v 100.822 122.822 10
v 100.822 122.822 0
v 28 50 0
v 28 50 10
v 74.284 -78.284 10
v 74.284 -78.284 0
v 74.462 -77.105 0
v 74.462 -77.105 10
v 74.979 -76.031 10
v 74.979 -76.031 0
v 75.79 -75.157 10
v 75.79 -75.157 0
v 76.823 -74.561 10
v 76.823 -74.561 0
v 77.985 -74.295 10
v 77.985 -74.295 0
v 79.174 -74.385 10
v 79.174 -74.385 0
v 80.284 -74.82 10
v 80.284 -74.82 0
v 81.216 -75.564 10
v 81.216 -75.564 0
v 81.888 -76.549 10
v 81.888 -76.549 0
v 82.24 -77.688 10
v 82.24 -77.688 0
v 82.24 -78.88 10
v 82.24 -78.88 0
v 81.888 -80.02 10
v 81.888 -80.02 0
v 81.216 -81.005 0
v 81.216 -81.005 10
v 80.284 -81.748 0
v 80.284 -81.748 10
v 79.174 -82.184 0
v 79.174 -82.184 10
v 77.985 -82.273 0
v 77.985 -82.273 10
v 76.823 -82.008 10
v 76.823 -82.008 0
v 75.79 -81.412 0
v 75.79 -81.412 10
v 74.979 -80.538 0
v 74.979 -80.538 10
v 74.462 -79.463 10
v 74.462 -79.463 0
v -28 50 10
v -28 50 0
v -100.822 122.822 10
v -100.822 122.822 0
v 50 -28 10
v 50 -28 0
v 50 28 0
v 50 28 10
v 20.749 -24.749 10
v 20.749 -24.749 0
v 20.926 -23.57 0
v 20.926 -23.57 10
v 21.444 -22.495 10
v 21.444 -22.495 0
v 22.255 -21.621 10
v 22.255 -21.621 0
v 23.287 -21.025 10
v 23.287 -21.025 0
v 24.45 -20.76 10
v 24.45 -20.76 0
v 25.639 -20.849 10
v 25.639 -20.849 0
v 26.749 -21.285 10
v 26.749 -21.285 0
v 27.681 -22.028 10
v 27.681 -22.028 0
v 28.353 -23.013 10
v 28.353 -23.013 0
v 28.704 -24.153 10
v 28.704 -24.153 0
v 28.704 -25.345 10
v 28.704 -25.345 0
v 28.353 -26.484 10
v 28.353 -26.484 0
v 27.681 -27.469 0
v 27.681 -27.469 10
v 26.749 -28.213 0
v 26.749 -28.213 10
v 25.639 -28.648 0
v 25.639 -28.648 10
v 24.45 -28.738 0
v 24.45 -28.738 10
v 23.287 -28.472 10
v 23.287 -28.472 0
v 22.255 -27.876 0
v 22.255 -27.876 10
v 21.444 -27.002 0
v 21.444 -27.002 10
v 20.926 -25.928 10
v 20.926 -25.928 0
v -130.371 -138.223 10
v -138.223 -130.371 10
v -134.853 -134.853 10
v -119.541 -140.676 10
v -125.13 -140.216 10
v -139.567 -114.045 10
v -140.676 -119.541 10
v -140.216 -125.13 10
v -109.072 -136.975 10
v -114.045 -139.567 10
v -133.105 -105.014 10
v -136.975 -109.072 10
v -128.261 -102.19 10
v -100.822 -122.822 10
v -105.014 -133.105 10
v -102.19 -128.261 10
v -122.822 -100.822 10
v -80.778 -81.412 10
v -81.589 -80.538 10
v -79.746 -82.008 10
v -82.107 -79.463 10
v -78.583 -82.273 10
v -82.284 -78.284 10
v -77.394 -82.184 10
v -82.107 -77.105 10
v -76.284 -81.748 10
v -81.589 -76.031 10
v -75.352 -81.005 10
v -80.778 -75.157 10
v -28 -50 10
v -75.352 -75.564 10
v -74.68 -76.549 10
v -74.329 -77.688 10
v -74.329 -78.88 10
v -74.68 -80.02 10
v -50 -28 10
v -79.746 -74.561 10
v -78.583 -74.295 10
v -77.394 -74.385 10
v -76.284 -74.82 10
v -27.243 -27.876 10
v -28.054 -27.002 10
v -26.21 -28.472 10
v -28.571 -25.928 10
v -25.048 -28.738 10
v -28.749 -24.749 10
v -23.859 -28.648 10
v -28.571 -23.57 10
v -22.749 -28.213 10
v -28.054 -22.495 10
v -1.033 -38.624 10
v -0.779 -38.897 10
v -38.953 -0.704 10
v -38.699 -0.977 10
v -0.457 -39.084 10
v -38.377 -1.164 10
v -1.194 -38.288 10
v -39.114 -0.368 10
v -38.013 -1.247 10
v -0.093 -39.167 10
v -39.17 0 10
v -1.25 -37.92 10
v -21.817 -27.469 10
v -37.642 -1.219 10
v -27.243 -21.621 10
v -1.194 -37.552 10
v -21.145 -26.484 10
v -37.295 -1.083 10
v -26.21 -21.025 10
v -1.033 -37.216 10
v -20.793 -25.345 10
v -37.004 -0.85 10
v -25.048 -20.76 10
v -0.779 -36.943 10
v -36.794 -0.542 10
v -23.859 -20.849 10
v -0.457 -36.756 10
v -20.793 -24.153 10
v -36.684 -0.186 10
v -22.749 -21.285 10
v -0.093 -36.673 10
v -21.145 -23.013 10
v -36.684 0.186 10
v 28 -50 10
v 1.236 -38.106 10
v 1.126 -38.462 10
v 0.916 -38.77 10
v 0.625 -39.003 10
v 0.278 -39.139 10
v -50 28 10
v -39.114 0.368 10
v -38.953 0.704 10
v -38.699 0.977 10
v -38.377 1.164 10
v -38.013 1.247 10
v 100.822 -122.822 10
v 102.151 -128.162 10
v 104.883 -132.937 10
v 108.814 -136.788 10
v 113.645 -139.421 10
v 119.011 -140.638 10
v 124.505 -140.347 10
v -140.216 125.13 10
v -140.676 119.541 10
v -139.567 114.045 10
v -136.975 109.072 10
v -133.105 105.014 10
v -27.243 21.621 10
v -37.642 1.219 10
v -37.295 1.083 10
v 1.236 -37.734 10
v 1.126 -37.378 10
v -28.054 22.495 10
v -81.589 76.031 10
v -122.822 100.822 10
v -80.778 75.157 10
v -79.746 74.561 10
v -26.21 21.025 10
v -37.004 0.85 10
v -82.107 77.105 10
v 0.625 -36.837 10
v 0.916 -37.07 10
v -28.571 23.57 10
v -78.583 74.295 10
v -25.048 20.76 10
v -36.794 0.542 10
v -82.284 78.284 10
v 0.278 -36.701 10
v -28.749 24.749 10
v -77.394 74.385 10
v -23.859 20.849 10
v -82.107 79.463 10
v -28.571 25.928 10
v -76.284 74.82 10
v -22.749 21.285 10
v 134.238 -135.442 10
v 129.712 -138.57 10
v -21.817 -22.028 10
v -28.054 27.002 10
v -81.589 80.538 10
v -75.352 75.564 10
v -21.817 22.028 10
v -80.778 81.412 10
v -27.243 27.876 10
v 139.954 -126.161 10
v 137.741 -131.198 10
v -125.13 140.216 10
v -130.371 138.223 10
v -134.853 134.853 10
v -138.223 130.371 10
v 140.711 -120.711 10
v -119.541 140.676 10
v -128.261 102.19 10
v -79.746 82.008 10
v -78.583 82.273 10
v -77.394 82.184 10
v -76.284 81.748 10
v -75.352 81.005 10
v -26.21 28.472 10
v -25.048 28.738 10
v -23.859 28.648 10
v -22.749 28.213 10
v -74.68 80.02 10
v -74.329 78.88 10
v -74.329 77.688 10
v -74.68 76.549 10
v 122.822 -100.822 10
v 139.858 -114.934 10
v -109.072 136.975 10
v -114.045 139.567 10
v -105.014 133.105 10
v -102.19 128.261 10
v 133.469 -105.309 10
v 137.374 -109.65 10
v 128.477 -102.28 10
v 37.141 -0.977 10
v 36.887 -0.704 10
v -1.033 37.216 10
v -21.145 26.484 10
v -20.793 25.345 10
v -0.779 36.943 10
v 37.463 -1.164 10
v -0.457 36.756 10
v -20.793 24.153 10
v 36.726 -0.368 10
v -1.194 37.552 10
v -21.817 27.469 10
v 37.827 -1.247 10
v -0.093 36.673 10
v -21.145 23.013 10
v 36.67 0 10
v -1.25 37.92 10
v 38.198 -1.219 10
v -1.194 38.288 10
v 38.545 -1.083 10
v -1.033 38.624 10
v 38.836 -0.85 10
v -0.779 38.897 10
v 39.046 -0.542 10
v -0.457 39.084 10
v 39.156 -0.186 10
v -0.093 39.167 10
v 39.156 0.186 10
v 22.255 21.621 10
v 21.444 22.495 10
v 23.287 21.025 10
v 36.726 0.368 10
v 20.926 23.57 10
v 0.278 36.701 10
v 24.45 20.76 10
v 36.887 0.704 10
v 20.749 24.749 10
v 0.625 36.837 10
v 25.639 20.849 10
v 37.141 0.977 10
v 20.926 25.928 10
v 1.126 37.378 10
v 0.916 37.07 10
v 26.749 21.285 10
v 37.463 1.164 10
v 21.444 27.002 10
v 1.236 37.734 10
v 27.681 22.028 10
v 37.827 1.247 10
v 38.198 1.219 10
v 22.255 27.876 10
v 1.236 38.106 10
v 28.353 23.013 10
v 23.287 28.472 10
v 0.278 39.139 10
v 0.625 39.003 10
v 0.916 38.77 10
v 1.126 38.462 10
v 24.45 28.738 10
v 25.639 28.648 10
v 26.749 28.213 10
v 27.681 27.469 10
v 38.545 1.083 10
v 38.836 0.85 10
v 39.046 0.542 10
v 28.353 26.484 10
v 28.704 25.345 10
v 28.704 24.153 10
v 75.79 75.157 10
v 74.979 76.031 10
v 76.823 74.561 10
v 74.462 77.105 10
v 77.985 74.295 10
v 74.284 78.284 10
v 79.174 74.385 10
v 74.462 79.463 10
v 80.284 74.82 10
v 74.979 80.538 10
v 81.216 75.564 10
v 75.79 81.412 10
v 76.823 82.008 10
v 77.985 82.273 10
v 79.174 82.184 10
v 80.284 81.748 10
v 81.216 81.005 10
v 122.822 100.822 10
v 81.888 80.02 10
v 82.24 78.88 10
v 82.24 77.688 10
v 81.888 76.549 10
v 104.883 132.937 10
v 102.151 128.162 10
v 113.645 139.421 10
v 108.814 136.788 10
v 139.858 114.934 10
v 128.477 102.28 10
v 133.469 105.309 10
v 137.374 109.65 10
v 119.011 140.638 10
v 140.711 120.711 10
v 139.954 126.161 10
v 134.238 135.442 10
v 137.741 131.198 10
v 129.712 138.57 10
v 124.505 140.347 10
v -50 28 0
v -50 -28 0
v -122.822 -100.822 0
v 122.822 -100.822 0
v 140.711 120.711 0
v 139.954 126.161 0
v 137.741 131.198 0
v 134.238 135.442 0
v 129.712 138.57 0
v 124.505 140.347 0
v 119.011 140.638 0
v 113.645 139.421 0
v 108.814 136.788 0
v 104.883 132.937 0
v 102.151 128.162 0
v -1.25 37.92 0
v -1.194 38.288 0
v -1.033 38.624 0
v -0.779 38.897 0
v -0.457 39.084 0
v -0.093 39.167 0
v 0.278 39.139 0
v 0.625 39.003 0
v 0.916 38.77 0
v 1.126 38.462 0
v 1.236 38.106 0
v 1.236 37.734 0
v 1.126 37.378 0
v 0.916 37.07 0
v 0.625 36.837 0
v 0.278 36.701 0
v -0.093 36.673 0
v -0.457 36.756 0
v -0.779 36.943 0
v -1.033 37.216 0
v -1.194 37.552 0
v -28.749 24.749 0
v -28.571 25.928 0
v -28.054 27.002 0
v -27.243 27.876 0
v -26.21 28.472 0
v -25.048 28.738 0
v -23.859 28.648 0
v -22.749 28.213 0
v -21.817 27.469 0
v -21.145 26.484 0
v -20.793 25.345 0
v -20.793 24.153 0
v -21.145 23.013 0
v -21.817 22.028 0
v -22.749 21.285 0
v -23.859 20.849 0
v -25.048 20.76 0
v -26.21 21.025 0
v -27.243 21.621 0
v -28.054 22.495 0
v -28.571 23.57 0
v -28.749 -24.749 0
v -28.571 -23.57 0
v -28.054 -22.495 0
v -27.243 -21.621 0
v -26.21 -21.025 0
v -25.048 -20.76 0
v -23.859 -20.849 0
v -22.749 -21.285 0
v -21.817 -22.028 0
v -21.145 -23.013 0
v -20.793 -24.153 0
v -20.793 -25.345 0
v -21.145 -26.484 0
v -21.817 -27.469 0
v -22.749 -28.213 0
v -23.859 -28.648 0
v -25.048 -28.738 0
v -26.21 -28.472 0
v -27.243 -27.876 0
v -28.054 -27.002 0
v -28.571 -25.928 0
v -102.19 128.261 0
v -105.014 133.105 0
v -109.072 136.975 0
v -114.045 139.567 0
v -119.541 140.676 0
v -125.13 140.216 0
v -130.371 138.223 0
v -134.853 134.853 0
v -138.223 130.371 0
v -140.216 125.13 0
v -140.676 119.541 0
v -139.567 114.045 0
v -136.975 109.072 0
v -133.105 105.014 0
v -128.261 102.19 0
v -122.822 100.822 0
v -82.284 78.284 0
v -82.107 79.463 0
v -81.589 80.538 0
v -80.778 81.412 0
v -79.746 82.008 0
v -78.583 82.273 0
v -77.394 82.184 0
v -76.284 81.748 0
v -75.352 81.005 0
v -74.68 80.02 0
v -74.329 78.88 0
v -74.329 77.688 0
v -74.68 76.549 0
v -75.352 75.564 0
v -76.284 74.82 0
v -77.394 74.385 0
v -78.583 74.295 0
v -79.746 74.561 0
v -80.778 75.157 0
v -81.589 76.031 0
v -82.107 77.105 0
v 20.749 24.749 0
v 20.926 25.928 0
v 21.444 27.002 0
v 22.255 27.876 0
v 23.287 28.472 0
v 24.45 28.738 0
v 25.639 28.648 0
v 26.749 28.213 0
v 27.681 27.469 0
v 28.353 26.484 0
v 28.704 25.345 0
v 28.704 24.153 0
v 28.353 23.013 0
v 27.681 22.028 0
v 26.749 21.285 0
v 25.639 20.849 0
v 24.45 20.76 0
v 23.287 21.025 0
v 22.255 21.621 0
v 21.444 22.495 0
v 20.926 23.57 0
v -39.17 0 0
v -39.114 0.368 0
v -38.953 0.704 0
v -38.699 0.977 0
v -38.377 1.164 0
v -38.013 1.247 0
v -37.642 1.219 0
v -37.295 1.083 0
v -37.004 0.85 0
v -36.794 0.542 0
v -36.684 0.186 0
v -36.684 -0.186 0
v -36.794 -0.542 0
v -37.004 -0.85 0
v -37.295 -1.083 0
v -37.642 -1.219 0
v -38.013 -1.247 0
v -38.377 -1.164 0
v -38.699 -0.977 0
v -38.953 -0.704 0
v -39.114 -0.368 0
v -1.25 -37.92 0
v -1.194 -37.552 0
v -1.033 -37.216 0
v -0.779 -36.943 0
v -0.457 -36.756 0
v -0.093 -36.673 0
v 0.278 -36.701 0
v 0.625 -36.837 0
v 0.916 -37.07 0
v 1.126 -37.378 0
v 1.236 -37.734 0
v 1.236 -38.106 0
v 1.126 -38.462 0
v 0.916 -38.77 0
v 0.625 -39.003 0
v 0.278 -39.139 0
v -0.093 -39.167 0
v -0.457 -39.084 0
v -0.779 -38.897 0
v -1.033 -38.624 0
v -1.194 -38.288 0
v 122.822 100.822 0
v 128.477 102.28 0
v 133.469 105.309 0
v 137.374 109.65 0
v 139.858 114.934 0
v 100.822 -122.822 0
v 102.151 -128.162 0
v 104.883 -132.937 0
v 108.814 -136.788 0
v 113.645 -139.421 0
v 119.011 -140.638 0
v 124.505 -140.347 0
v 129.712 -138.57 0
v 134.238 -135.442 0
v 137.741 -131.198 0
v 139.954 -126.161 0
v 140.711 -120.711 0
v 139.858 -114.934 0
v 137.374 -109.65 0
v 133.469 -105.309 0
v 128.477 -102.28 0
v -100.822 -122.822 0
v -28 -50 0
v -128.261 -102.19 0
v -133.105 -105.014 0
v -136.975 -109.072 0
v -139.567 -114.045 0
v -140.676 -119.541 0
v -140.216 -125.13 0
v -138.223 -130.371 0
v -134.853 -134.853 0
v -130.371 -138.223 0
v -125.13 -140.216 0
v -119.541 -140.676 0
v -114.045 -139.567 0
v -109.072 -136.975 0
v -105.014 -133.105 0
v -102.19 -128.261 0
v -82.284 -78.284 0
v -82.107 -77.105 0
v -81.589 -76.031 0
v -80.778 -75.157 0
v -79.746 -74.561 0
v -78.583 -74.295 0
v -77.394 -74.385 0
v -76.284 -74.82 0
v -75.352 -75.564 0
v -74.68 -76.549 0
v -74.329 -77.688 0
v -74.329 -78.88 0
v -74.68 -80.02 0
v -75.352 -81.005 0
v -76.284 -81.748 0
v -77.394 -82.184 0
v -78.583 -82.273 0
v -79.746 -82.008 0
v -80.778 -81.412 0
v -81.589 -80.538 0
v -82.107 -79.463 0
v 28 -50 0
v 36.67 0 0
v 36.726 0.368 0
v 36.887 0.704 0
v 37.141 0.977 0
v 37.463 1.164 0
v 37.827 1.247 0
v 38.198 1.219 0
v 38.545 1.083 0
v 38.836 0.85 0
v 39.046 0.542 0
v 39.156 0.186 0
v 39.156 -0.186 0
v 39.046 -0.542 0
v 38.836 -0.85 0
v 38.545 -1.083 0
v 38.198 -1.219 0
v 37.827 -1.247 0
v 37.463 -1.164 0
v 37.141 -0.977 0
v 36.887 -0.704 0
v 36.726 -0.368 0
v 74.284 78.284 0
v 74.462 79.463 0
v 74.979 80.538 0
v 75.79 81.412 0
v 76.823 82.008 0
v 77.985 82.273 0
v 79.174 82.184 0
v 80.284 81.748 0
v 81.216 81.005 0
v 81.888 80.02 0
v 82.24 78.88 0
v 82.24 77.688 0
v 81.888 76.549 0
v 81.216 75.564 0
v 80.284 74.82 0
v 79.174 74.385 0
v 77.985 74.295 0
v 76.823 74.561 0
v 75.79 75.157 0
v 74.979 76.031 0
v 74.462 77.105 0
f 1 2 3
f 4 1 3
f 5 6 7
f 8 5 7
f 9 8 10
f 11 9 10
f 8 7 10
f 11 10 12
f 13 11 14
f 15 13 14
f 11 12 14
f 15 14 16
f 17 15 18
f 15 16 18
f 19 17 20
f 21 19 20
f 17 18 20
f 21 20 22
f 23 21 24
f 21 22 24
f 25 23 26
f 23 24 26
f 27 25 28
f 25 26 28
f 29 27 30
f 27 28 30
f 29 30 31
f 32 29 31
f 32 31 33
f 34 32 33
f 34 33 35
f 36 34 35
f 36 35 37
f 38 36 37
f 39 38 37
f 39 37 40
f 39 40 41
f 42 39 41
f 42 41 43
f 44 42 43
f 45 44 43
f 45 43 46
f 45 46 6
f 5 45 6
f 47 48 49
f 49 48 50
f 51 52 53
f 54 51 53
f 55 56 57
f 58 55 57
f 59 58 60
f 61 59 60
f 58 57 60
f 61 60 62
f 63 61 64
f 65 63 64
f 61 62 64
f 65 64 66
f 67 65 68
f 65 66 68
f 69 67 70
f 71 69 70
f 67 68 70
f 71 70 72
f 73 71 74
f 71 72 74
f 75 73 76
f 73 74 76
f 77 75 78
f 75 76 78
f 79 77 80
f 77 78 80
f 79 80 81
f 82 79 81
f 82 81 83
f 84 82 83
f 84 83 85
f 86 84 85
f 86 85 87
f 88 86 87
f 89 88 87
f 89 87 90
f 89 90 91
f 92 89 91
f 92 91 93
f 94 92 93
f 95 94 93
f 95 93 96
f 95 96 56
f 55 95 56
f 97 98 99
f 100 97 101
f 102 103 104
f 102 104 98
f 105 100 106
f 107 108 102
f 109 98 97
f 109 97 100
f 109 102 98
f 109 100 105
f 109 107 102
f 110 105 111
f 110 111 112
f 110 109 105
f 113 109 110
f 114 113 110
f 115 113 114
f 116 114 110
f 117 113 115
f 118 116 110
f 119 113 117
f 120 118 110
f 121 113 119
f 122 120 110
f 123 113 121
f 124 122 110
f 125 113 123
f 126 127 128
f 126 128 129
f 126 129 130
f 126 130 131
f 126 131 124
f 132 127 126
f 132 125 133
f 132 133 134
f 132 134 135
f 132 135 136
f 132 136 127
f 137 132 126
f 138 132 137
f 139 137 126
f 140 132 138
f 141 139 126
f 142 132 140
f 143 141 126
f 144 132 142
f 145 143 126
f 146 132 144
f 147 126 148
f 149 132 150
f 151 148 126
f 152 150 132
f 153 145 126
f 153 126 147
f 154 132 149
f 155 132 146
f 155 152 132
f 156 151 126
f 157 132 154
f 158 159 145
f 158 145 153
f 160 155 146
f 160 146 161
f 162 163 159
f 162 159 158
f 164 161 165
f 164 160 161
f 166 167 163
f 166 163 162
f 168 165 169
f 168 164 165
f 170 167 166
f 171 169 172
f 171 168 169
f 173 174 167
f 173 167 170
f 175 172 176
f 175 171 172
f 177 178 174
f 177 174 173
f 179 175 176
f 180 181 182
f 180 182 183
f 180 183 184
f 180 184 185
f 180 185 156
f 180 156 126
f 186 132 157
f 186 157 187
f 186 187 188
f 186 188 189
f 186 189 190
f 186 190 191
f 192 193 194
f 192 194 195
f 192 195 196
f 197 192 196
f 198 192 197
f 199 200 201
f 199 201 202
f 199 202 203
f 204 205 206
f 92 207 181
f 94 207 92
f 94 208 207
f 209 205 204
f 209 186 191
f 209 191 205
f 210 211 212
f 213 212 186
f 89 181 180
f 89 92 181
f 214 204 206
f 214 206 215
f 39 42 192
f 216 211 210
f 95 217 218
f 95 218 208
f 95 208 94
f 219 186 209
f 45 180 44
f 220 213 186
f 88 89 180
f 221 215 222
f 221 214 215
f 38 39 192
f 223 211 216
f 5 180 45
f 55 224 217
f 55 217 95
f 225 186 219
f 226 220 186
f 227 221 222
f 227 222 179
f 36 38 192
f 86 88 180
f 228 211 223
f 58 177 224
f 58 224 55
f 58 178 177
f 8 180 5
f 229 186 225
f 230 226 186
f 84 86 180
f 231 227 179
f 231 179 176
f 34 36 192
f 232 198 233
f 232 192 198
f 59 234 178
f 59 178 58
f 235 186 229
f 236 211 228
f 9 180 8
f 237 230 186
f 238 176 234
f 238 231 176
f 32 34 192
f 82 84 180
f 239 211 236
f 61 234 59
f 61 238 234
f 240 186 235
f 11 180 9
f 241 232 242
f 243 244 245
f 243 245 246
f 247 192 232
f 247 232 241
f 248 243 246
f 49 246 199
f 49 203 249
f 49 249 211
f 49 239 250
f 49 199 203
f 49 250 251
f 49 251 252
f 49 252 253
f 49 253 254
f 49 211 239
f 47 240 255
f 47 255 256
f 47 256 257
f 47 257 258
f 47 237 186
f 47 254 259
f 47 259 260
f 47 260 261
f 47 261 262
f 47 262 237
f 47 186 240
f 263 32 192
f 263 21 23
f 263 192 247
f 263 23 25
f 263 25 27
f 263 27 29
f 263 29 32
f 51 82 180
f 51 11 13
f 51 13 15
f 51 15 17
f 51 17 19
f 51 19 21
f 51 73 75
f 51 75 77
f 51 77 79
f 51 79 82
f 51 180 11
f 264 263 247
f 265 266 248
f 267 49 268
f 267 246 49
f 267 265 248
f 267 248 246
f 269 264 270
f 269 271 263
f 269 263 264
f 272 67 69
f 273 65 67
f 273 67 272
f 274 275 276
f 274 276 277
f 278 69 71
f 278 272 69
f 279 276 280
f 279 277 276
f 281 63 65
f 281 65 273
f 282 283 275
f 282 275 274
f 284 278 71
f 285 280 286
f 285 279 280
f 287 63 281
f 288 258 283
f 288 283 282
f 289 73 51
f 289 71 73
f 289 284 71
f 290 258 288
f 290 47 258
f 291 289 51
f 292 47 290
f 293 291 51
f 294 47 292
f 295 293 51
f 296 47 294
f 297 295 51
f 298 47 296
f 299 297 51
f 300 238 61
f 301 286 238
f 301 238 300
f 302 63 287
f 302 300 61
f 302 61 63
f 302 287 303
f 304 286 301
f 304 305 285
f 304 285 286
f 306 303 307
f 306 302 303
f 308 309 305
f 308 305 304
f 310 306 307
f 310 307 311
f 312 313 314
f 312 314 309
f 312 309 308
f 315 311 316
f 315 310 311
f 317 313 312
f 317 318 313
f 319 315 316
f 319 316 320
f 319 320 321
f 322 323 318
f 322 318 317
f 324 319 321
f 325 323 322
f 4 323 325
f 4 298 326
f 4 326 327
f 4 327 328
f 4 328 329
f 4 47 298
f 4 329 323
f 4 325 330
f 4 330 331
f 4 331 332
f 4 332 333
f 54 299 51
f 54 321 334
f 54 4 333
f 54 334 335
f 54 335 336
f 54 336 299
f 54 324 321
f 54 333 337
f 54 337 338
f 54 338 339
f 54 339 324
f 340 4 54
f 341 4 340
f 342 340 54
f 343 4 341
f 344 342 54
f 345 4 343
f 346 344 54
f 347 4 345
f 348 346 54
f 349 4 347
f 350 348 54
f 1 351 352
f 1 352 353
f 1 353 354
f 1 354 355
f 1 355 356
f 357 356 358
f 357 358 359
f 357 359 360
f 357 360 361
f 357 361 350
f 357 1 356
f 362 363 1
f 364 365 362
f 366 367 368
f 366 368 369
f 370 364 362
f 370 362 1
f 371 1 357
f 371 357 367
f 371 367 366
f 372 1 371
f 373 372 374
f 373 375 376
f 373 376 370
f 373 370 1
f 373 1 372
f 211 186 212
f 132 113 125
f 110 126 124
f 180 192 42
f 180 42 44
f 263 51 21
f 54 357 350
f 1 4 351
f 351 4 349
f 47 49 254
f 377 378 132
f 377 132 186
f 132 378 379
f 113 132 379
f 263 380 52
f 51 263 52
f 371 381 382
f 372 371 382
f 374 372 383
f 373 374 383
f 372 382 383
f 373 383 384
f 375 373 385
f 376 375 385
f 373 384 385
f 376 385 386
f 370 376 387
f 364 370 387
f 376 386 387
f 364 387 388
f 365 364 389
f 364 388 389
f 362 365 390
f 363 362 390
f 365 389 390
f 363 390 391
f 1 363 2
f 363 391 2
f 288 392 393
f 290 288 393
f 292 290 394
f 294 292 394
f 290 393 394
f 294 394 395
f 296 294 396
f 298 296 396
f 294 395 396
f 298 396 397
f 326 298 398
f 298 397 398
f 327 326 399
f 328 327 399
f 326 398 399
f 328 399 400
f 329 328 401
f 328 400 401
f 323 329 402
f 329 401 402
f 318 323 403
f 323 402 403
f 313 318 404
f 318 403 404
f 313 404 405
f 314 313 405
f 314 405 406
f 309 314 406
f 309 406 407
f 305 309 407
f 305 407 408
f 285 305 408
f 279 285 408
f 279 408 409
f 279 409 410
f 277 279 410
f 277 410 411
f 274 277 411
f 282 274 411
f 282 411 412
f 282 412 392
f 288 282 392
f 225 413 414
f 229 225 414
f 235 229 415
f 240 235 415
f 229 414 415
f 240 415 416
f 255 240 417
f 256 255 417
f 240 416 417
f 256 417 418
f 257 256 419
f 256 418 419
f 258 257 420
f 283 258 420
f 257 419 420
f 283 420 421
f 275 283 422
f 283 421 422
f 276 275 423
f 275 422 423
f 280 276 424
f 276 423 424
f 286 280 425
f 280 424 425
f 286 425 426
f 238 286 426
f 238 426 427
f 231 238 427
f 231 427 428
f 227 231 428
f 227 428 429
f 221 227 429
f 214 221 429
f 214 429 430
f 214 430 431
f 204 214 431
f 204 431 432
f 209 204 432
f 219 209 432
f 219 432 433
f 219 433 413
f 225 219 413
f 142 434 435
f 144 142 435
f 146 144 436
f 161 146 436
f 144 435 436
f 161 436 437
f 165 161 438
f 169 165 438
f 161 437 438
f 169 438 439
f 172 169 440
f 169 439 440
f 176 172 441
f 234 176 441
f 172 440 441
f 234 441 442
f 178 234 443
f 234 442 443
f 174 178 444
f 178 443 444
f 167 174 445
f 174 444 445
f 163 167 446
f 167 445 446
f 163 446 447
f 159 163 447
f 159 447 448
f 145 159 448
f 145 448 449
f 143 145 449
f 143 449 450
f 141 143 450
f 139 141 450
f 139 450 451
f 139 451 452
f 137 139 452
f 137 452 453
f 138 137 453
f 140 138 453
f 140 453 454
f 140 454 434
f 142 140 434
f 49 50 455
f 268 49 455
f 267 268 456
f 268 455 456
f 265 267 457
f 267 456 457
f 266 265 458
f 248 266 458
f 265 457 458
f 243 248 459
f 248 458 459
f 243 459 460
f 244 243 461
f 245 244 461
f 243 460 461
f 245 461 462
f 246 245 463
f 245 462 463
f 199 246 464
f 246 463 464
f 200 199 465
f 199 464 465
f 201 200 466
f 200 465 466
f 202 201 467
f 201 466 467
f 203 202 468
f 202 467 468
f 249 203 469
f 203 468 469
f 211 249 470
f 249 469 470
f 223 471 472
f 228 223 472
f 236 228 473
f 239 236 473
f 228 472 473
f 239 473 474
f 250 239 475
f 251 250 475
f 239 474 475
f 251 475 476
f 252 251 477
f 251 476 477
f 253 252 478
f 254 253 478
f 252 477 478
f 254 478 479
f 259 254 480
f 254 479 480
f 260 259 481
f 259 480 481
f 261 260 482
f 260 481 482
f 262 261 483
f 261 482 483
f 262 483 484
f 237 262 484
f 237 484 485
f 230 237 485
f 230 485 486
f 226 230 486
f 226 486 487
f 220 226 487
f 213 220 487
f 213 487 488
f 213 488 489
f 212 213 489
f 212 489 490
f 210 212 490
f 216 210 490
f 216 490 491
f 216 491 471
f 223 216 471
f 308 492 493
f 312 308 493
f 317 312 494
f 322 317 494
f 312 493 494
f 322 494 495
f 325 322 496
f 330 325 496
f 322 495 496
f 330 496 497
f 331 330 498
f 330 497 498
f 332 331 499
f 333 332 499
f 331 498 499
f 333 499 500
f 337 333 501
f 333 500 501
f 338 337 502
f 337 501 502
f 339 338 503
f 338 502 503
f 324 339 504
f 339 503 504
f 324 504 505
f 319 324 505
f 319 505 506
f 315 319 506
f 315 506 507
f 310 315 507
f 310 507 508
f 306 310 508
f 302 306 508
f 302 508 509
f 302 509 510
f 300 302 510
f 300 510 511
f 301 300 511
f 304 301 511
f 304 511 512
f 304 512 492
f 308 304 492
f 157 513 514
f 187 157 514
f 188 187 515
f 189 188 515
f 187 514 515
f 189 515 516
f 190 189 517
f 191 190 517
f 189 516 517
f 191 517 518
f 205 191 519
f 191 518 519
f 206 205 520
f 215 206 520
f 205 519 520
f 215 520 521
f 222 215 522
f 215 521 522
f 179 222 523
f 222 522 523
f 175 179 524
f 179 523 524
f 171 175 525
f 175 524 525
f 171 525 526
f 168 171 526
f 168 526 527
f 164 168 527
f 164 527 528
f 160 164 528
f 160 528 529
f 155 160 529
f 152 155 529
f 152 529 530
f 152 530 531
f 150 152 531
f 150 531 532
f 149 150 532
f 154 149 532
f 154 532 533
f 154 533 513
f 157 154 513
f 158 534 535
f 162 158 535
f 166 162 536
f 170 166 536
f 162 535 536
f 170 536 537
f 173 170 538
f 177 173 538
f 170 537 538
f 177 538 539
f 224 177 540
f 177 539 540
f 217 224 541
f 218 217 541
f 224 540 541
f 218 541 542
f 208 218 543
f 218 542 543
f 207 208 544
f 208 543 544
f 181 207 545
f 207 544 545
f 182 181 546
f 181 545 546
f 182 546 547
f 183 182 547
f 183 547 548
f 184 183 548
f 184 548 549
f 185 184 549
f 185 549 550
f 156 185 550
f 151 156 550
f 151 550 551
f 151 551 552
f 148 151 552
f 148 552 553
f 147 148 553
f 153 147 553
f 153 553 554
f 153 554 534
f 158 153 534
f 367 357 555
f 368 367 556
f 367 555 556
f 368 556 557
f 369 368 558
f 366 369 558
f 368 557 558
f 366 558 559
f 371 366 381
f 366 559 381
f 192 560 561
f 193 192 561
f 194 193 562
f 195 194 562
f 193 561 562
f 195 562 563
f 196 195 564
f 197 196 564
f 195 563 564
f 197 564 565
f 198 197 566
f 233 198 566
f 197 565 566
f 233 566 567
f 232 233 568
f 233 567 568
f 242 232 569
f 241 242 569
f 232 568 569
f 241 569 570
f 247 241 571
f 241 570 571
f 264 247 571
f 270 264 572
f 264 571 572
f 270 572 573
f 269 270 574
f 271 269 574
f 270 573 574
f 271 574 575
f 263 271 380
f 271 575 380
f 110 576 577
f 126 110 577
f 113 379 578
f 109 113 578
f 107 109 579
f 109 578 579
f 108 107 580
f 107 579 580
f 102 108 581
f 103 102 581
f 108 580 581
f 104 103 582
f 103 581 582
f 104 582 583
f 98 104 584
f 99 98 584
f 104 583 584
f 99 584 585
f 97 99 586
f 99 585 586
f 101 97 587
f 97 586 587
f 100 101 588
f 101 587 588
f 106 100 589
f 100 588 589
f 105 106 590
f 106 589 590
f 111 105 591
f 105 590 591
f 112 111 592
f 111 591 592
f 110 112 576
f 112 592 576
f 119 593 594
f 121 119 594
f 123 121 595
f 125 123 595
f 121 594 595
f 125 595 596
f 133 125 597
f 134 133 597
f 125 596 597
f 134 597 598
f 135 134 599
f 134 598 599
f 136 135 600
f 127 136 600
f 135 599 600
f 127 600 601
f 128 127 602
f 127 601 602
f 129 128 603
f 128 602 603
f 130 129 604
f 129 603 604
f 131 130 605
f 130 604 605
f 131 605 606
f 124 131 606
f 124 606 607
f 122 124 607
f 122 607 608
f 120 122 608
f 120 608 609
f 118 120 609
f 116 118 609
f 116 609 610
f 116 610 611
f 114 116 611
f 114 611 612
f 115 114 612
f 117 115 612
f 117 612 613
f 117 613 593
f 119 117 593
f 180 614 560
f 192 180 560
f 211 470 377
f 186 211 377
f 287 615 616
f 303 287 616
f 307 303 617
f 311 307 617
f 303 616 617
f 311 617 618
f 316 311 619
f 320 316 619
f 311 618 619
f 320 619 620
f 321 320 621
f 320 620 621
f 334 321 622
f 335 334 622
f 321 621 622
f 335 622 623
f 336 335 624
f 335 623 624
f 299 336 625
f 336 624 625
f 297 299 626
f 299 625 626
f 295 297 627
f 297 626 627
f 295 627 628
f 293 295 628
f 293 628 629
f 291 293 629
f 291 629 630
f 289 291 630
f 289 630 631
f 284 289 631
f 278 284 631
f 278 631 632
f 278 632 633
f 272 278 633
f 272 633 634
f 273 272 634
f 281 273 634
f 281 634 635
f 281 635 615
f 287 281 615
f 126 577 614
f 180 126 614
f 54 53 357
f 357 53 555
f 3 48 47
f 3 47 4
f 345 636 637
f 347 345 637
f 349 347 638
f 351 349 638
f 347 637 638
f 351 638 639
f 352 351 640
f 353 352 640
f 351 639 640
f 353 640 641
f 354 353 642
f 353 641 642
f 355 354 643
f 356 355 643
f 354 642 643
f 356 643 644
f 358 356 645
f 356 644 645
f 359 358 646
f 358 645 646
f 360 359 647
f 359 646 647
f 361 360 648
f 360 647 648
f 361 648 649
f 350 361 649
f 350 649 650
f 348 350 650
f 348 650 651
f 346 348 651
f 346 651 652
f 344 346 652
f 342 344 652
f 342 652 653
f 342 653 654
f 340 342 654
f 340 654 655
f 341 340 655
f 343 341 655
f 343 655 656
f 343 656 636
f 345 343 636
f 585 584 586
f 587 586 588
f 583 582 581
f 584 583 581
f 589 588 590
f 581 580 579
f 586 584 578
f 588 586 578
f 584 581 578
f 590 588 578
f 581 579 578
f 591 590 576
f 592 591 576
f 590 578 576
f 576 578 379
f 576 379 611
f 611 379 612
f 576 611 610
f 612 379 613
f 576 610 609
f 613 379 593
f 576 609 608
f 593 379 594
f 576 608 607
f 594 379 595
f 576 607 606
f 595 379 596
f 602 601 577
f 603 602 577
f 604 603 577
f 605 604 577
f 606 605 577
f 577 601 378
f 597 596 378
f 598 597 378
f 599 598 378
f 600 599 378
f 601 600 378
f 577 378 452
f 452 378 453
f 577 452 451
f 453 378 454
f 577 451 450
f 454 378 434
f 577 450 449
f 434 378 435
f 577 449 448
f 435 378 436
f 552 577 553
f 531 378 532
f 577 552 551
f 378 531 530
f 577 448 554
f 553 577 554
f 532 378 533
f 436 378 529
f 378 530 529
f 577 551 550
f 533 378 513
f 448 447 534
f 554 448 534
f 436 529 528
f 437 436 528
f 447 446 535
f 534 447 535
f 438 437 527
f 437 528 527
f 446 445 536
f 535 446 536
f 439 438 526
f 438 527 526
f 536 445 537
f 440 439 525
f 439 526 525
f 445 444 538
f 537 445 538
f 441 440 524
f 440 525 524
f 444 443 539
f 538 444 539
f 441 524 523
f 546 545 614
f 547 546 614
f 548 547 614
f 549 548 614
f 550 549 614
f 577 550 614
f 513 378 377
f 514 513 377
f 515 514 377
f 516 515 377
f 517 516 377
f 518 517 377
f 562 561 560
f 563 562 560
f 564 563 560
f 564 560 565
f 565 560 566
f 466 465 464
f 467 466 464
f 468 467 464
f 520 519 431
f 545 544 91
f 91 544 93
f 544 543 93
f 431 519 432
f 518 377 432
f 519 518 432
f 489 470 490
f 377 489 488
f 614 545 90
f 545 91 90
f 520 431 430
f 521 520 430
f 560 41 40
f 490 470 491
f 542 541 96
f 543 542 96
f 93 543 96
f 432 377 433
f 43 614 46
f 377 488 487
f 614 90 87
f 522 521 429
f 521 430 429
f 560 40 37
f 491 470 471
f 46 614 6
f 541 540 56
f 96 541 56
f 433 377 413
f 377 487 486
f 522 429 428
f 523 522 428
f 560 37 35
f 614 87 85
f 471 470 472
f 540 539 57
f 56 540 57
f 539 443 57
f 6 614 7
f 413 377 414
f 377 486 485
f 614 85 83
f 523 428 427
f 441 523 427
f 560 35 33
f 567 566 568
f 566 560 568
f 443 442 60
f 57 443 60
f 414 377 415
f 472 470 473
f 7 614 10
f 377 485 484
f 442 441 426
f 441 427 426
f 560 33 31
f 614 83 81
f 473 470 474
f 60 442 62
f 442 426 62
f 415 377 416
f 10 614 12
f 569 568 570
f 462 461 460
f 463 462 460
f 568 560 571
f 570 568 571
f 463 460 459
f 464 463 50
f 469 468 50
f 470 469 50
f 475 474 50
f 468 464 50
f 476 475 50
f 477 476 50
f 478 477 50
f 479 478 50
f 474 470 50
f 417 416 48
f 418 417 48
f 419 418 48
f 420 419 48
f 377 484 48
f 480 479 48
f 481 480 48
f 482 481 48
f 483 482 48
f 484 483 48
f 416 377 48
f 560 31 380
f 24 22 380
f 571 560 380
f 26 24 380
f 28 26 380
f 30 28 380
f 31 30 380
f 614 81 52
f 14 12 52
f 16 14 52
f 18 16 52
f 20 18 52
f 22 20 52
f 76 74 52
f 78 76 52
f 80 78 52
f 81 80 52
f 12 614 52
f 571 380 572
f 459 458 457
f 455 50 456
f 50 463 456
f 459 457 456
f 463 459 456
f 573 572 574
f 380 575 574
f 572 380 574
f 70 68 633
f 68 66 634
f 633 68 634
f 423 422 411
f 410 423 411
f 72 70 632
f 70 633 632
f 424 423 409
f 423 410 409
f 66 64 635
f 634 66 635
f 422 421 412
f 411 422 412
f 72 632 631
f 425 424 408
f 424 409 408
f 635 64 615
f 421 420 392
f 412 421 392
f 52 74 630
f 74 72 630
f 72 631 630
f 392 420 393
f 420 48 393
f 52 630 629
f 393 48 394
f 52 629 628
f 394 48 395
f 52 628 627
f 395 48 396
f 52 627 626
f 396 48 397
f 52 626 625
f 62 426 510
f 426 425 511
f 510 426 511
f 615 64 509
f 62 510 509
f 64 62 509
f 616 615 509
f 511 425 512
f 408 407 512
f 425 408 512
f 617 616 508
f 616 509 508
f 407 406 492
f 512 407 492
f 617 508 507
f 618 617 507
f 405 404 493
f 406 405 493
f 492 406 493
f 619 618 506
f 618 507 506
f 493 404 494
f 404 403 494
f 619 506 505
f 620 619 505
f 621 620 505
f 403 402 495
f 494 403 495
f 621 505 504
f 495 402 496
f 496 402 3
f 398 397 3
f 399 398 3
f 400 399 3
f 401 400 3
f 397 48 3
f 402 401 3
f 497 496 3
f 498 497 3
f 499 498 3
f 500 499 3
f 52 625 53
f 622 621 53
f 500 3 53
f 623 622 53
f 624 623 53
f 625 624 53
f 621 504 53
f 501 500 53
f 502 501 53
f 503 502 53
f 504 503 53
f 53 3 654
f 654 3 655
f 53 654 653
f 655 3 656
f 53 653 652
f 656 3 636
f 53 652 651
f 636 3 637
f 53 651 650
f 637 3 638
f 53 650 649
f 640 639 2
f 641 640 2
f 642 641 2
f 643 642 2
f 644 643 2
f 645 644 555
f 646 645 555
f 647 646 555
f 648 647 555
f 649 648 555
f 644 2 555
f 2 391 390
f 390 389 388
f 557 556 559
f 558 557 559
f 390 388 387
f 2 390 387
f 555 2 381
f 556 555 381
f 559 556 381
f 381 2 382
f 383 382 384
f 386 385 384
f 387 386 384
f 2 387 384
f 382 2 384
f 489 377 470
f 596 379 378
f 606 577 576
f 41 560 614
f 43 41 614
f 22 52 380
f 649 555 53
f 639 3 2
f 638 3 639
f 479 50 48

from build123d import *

# Parameters (mm, degrees)
ESQUISSE1_W             = 100
ESQUISSE1_H             = 100
BOSS_EXTRU_1_DEPTH      = 10
ESQUISSE3_R             = 4
ESQUISSE3_R_2           = 1.25
ENL_V_MAT_EXTRU_2_DEPTH = 200.246053595


with BuildPart() as part:
    # Esquisse1 → Boss.-Extru.1 (new body)
    with BuildSketch(Plane.XY):
        with BuildLine():
            ThreePointArc((-100.822483701, 122.822483701), (-134.852813742, 134.852813742), (-122.822483701, 100.822483701))
            Line((-122.822483701, 100.822483701), (-131.710678119, 109.710678119))
            Line((-131.710678119, 109.710678119), (-109.710678119, 131.710678119))
            Line((-109.710678119, 131.710678119), (-100.822483701, 122.822483701))
        make_face()
        with BuildLine():
            Line((-131.710678119, 109.710678119), (-122.822483701, 100.822483701))
            ThreePointArc((-122.822483701, 100.822483701), (-107.336002639, 105.840639254), (-100.710678119, 120.710678119))
            ThreePointArc((-100.710678119, 120.710678119), (-100.738649074, 121.768059709), (-100.822483701, 122.822483701))
            Line((-100.822483701, 122.822483701), (-109.710678119, 131.710678119))
            Line((-109.710678119, 131.710678119), (-131.710678119, 109.710678119))
        make_face()
        with BuildLine():
            Line((-122.822483701, 100.822483701), (-50, 28))
            Line((-50, 28), (-50, 50))
            Line((-50, 50), (-28, 50))
            Line((-28, 50), (-100.822483701, 122.822483701))
            ThreePointArc((-100.822483701, 122.822483701), (-100.738649074, 121.768059709), (-100.710678119, 120.710678119))
            ThreePointArc((-100.710678119, 120.710678119), (-107.336002639, 105.840639254), (-122.822483701, 100.822483701))
        make_face()
        with BuildLine():
            Line((100.822483701, 122.822483701), (28, 50))
            Line((28, 50), (50, 50))
            Line((50, 50), (50, 28))
            Line((50, 28), (122.822483701, 100.822483701))
            ThreePointArc((122.822483701, 100.822483701), (106.568542495, 106.568542495), (100.822483701, 122.822483701))
        make_face()
        with BuildLine():
            ThreePointArc((140.710678119, 120.710678119), (121.768059709, 140.682707164), (100.822483701, 122.822483701))
            Line((100.822483701, 122.822483701), (109.710678119, 131.710678119))
            Line((109.710678119, 131.710678119), (131.710678119, 109.710678119))
            Line((131.710678119, 109.710678119), (122.822483701, 100.822483701))
            ThreePointArc((122.822483701, 100.822483701), (135.580716983, 107.336002639), (140.710678119, 120.710678119))
        make_face()
        with BuildLine():
            Line((109.710678119, 131.710678119), (100.822483701, 122.822483701))
            ThreePointArc((100.822483701, 122.822483701), (106.568542495, 106.568542495), (122.822483701, 100.822483701))
            Line((122.822483701, 100.822483701), (131.710678119, 109.710678119))
            Line((131.710678119, 109.710678119), (109.710678119, 131.710678119))
        make_face()
        Rectangle(ESQUISSE1_W, ESQUISSE1_H)
        with BuildLine():
            ThreePointArc((122.822483701, -100.822483701), (106.568542495, -106.568542495), (100.822483701, -122.822483701))
            Line((100.822483701, -122.822483701), (109.710678119, -131.710678119))
            Line((109.710678119, -131.710678119), (131.710678119, -109.710678119))
            Line((131.710678119, -109.710678119), (122.822483701, -100.822483701))
        make_face()
        with BuildLine():
            Line((109.710678119, -131.710678119), (100.822483701, -122.822483701))
            ThreePointArc((100.822483701, -122.822483701), (121.768059709, -140.682707164), (140.710678119, -120.710678119))
            ThreePointArc((140.710678119, -120.710678119), (135.580716983, -107.336002639), (122.822483701, -100.822483701))
            Line((122.822483701, -100.822483701), (131.710678119, -109.710678119))
            Line((131.710678119, -109.710678119), (109.710678119, -131.710678119))
        make_face()
        with BuildLine():
            Line((50, -50), (28, -50))
            Line((28, -50), (100.822483701, -122.822483701))
            ThreePointArc((100.822483701, -122.822483701), (106.568542495, -106.568542495), (122.822483701, -100.822483701))
            Line((122.822483701, -100.822483701), (50, -28))
            Line((50, -28), (50, -50))
        make_face()
        with BuildLine():
            ThreePointArc((-100.710678119, -120.710678119), (-107.336002639, -105.840639254), (-122.822483701, -100.822483701))
            Line((-122.822483701, -100.822483701), (-131.710678119, -109.710678119))
            Line((-131.710678119, -109.710678119), (-109.710678119, -131.710678119))
            Line((-109.710678119, -131.710678119), (-100.822483701, -122.822483701))
            ThreePointArc((-100.822483701, -122.822483701), (-100.738649074, -121.768059709), (-100.710678119, -120.710678119))
        make_face()
        with BuildLine():
            Line((-131.710678119, -109.710678119), (-122.822483701, -100.822483701))
            ThreePointArc((-122.822483701, -100.822483701), (-134.852813742, -134.852813742), (-100.822483701, -122.822483701))
            Line((-100.822483701, -122.822483701), (-109.710678119, -131.710678119))
            Line((-109.710678119, -131.710678119), (-131.710678119, -109.710678119))
        make_face()
        with BuildLine():
            Line((-50, -50), (-50, -28))
            Line((-50, -28), (-122.822483701, -100.822483701))
            ThreePointArc((-122.822483701, -100.822483701), (-107.336002639, -105.840639254), (-100.710678119, -120.710678119))
            ThreePointArc((-100.710678119, -120.710678119), (-100.738649074, -121.768059709), (-100.822483701, -122.822483701))
            Line((-100.822483701, -122.822483701), (-28, -50))
            Line((-28, -50), (-50, -50))
        make_face()
    extrude(amount=BOSS_EXTRU_1_DEPTH)

    # Esquisse3 → Enlèv. mat.-Extru.2 (cut, through all)
    with BuildSketch(Plane(origin=(0, 0, 0), x_dir=(-1, 0, 0), z_dir=(0, 0, -1))):
        with Locations((-78.284271247, 78.284271247)):
            Circle(ESQUISSE3_R)
        with Locations((-24.748737342, 24.748737342)):
            Circle(ESQUISSE3_R)
        with Locations((78.284271247, 78.284271247)):
            Circle(ESQUISSE3_R)
        with Locations((24.748737342, 24.748737342)):
            Circle(ESQUISSE3_R)
        with Locations((78.284271247, -78.284271247)):
            Circle(ESQUISSE3_R)
        with Locations((24.748737342, -24.748737342)):
            Circle(ESQUISSE3_R)
        with Locations((-78.284271247, -78.284271247)):
            Circle(ESQUISSE3_R)
        with Locations((-24.748737342, -24.748737342)):
            Circle(ESQUISSE3_R)
        with Locations((-37.92, 0)):
            Circle(ESQUISSE3_R_2)
        with Locations((0, 37.92)):
            Circle(ESQUISSE3_R_2)
        with Locations((37.92, 0)):
            Circle(ESQUISSE3_R_2)
        with Locations((0, -37.92)):
            Circle(ESQUISSE3_R_2)
    extrude(amount=-ENL_V_MAT_EXTRU_2_DEPTH, mode=Mode.SUBTRACT)


solid = part.part
